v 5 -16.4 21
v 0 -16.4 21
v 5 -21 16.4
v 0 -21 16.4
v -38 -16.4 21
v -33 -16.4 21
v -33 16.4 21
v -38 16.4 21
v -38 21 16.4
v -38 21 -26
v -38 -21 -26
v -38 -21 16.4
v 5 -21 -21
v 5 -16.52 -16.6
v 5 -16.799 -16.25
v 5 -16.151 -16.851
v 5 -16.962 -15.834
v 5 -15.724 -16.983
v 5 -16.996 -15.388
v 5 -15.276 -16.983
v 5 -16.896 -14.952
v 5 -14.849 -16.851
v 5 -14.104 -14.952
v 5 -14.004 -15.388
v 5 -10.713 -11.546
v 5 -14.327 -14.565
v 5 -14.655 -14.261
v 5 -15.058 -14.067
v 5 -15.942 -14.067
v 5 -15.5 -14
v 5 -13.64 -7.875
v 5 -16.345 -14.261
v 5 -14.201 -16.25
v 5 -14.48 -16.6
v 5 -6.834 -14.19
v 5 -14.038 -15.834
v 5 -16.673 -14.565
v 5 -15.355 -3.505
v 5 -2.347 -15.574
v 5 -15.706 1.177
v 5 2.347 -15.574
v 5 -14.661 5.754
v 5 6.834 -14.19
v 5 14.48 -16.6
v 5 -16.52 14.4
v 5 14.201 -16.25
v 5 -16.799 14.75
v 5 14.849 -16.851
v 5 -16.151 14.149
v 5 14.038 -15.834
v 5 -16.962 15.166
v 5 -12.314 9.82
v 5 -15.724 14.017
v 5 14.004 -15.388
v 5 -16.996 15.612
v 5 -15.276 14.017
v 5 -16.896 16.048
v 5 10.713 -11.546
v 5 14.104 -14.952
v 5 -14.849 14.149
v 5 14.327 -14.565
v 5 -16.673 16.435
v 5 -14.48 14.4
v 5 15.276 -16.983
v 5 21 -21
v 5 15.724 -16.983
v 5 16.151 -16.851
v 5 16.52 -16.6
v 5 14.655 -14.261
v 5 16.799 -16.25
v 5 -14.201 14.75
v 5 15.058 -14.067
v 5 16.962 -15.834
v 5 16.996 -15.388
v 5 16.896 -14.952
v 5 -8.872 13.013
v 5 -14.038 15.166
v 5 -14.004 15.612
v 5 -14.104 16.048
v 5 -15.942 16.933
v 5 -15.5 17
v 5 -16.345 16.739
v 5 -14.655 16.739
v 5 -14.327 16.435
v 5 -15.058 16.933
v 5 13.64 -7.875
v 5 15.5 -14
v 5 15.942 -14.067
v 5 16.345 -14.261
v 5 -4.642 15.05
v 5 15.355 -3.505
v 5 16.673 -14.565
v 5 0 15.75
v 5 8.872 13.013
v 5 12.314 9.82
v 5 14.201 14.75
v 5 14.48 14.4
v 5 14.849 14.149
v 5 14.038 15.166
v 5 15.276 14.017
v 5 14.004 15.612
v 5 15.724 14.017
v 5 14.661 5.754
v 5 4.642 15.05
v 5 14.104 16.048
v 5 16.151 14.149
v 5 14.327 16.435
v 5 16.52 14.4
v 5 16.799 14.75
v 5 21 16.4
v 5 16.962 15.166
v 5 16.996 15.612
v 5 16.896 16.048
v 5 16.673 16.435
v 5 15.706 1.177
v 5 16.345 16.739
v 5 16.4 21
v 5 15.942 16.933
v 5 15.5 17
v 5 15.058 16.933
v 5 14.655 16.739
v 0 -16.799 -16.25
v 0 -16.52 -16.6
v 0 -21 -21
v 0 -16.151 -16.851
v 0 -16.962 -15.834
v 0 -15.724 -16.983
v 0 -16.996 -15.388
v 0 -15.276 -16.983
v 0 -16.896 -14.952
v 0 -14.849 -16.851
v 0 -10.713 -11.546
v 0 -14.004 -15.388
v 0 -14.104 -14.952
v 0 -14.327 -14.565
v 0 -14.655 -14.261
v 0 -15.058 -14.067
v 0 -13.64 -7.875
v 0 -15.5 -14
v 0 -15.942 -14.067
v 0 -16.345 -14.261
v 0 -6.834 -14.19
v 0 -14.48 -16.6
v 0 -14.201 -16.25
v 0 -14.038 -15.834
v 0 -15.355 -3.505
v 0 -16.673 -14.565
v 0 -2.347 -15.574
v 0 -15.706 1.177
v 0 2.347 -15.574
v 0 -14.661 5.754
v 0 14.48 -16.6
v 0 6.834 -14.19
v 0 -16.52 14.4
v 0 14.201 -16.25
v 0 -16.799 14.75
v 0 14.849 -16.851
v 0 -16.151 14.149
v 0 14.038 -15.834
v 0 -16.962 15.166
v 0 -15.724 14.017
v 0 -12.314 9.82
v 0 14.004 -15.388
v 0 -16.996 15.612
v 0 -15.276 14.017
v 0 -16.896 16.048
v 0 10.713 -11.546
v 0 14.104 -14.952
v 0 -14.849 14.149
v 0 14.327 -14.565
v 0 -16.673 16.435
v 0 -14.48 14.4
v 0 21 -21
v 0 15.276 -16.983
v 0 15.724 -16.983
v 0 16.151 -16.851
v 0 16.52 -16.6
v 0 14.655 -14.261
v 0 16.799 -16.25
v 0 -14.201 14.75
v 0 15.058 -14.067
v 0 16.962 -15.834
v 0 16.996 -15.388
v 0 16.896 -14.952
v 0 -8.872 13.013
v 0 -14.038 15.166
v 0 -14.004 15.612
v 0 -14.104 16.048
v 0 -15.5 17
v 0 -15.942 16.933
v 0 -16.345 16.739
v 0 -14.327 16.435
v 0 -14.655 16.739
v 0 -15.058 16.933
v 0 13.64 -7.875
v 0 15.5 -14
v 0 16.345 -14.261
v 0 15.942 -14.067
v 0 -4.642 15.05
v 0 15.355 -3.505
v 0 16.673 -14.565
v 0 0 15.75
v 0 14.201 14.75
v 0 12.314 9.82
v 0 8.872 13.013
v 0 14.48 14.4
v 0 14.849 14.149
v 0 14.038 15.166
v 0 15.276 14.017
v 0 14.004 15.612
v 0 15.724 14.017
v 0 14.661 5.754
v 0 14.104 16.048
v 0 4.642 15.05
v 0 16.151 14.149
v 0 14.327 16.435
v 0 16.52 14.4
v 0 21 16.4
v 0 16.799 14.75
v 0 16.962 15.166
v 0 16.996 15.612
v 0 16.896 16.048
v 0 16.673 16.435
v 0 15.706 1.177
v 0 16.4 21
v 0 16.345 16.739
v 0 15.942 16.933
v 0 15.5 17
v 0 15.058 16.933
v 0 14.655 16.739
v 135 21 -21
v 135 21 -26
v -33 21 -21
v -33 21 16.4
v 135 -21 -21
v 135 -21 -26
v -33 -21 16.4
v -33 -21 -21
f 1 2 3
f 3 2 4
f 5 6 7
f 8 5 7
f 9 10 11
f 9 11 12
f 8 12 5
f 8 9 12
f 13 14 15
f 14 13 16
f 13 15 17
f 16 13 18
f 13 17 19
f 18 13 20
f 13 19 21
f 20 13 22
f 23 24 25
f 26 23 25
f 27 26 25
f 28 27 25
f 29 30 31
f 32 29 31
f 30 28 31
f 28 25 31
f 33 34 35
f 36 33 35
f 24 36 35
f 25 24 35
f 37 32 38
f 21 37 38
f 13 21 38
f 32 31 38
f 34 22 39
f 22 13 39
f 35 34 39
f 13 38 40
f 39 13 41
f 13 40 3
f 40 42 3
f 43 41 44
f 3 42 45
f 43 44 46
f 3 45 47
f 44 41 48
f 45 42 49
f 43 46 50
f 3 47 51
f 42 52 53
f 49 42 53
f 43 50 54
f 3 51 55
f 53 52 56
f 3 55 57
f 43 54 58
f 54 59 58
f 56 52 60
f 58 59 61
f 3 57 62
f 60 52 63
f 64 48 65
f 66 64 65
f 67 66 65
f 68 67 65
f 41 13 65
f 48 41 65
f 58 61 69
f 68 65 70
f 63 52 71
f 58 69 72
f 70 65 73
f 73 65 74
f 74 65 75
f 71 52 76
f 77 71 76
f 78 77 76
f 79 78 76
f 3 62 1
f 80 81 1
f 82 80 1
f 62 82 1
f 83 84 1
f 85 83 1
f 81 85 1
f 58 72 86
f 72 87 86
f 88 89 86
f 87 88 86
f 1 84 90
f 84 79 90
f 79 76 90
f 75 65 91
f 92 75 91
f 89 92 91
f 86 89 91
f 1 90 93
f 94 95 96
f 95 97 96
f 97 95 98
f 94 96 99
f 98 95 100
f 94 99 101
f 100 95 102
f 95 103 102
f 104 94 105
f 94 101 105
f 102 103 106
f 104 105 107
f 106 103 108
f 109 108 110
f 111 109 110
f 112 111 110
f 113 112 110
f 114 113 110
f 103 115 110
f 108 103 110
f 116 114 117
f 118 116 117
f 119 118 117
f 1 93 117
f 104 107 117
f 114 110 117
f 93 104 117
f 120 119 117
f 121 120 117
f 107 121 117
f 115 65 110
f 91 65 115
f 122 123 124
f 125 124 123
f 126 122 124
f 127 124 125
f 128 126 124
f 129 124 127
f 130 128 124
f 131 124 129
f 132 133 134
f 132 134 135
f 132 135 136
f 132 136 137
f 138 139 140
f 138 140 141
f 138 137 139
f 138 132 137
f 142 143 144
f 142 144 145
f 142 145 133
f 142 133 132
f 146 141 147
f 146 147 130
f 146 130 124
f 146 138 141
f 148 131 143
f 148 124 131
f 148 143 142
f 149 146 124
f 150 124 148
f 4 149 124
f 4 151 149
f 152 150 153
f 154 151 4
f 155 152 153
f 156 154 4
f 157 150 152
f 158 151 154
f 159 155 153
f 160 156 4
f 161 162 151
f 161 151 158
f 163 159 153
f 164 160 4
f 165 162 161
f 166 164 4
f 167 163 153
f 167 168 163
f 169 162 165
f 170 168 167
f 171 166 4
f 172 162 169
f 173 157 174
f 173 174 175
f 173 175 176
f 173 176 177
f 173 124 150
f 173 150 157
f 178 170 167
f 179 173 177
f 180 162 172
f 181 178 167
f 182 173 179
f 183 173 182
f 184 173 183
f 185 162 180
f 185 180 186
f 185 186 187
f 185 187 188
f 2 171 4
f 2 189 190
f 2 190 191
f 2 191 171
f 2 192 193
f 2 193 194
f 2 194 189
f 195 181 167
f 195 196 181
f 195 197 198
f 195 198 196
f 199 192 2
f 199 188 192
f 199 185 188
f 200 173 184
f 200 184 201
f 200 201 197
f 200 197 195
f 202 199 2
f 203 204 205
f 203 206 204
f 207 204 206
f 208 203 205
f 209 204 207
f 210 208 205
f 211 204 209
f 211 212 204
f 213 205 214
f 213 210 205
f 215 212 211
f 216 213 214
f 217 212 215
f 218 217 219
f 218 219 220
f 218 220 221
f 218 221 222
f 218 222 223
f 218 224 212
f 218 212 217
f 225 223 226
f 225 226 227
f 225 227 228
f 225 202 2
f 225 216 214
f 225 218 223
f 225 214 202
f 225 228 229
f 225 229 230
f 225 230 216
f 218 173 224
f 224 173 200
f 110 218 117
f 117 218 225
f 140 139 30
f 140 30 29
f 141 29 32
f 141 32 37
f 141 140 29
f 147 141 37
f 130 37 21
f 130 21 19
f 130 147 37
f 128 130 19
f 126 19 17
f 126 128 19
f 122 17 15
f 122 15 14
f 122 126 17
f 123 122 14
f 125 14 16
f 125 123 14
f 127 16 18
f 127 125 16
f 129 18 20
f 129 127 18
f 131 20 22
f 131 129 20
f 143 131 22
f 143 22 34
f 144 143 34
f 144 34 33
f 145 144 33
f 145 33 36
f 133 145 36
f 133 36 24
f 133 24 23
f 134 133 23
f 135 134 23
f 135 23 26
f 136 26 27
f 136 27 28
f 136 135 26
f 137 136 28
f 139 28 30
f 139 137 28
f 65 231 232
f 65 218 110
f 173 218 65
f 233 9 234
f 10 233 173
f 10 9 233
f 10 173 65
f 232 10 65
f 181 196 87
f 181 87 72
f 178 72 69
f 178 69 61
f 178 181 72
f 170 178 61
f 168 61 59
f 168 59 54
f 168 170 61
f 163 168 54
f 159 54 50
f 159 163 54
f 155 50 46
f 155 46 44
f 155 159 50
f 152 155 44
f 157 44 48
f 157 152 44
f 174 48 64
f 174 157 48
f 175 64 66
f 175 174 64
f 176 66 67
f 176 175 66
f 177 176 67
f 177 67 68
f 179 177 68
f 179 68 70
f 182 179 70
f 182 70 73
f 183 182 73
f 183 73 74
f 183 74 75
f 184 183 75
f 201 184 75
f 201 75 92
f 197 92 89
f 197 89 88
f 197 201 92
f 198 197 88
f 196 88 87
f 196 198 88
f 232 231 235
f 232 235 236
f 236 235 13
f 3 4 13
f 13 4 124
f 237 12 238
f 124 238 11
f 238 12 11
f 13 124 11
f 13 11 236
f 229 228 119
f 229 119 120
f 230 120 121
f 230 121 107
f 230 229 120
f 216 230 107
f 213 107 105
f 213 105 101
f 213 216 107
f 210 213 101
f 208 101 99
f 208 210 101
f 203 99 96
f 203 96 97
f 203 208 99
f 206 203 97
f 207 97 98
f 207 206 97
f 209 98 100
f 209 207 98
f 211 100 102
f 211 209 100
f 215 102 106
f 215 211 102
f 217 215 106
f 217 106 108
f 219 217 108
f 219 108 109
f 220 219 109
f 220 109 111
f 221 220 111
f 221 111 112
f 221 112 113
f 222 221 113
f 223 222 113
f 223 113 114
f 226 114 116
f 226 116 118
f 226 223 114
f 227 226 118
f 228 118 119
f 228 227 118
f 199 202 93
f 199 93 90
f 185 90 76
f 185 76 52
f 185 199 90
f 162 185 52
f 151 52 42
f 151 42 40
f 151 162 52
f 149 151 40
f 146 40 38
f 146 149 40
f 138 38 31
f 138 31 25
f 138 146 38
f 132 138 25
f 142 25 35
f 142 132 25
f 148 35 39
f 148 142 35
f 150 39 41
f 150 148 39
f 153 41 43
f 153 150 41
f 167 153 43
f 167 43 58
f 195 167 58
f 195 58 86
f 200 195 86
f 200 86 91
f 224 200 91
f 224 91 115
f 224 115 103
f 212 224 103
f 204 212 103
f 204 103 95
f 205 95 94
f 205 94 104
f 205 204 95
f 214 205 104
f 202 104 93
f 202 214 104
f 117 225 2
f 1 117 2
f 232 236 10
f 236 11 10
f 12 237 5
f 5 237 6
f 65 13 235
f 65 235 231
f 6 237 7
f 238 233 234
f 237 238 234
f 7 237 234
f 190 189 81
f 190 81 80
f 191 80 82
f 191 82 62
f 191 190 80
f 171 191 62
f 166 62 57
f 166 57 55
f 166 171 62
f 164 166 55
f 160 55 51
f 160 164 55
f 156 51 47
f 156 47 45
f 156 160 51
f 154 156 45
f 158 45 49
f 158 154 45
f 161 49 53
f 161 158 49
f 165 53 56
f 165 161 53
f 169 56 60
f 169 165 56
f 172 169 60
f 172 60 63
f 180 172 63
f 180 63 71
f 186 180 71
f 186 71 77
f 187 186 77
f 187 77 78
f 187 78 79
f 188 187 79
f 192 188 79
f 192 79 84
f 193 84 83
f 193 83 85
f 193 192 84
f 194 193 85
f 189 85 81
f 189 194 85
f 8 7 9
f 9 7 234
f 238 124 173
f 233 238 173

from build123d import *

# Parameters (mm, degrees)
BOSS_EXTRUDE1_DEPTH = 5
BOSS_EXTRUDE3_DEPTH = 5
SKETCH5_W           = 5
SKETCH5_H           = 42
BOSS_EXTRUDE4_DEPTH = 33
SKETCH6_W           = 5
SKETCH6_H           = 42
BOSS_EXTRUDE5_DEPTH = 5
SKETCH7_W           = 5
SKETCH7_H           = 42
BOSS_EXTRUDE6_DEPTH = 130


with BuildPart() as part:
    # Sketch2 → Boss-Extrude1 (new body)
    with BuildSketch(Plane(origin=(0, 0, 0), x_dir=(0, 0, -1), z_dir=(1, 0, 0))):
        Polygon((-21, 16.4), (-21, -16.4), (-16.4, -21), (16.4, -21), (21, -16.4), (21, 16.4), (16.4, 21), (-16.4, 21), align=None)
        with BuildLine():
            ThreePointArc((-14, 15.5), (-15.5, 17), (-17, 15.5))
            ThreePointArc((-17, 15.5), (-15.5, 14), (-14, 15.5))
        make_face(mode=Mode.SUBTRACT)
        with BuildLine():
            ThreePointArc((15.75, 0), (0, 15.75), (-15.75, 0))
            ThreePointArc((-15.75, 0), (0, -15.75), (15.75, 0))
        make_face(mode=Mode.SUBTRACT)
        with BuildLine():
            ThreePointArc((17, -15.5), (15.5, -14), (14, -15.5))
            ThreePointArc((14, -15.5), (15.5, -17), (17, -15.5))
        make_face(mode=Mode.SUBTRACT)
        with BuildLine():
            ThreePointArc((17, 15.5), (15.5, 17), (14, 15.5))
            ThreePointArc((14, 15.5), (15.5, 14), (17, 15.5))
        make_face(mode=Mode.SUBTRACT)
        with BuildLine():
            ThreePointArc((-14, -15.5), (-15.5, -14), (-17, -15.5))
            ThreePointArc((-17, -15.5), (-15.5, -17), (-14, -15.5))
        make_face(mode=Mode.SUBTRACT)
    extrude(amount=BOSS_EXTRUDE1_DEPTH)

    # Sketch4 → Boss-Extrude3 (add)
    with BuildSketch(Plane(origin=(5, 0, 0), x_dir=(0, 0, -1), z_dir=(1, 0, 0))):
        Polygon((26, 21), (26, -21), (16.4, -21), (21, -16.4), (21, 16.4), (16.4, 21), align=None)
    extrude(amount=-BOSS_EXTRUDE3_DEPTH)

    # Sketch5 → Boss-Extrude4 (add)
    with BuildSketch(Plane.ZY):
        with Locations((-23.5, 0)):
            Rectangle(SKETCH5_W, SKETCH5_H)
    extrude(amount=BOSS_EXTRUDE4_DEPTH)

    # Sketch6 → Boss-Extrude5 (add)
    with BuildSketch(Plane.ZY.offset(33)):
        with Locations((-23.5, 0)):
            Rectangle(SKETCH6_W, SKETCH6_H)
        Polygon((21, 16.4), (16.4, 21), (-21, 21), (-21, -21), (16.4, -21), (21, -16.4), align=None)
    extrude(amount=BOSS_EXTRUDE5_DEPTH)

    # Sketch7 → Boss-Extrude6 (add)
    with BuildSketch(Plane(origin=(5, 0, 0), x_dir=(0, 0, -1), z_dir=(1, 0, 0))):
        with Locations((23.5, 0)):
            Rectangle(SKETCH7_W, SKETCH7_H)
    extrude(amount=BOSS_EXTRUDE6_DEPTH)


solid = part.part
